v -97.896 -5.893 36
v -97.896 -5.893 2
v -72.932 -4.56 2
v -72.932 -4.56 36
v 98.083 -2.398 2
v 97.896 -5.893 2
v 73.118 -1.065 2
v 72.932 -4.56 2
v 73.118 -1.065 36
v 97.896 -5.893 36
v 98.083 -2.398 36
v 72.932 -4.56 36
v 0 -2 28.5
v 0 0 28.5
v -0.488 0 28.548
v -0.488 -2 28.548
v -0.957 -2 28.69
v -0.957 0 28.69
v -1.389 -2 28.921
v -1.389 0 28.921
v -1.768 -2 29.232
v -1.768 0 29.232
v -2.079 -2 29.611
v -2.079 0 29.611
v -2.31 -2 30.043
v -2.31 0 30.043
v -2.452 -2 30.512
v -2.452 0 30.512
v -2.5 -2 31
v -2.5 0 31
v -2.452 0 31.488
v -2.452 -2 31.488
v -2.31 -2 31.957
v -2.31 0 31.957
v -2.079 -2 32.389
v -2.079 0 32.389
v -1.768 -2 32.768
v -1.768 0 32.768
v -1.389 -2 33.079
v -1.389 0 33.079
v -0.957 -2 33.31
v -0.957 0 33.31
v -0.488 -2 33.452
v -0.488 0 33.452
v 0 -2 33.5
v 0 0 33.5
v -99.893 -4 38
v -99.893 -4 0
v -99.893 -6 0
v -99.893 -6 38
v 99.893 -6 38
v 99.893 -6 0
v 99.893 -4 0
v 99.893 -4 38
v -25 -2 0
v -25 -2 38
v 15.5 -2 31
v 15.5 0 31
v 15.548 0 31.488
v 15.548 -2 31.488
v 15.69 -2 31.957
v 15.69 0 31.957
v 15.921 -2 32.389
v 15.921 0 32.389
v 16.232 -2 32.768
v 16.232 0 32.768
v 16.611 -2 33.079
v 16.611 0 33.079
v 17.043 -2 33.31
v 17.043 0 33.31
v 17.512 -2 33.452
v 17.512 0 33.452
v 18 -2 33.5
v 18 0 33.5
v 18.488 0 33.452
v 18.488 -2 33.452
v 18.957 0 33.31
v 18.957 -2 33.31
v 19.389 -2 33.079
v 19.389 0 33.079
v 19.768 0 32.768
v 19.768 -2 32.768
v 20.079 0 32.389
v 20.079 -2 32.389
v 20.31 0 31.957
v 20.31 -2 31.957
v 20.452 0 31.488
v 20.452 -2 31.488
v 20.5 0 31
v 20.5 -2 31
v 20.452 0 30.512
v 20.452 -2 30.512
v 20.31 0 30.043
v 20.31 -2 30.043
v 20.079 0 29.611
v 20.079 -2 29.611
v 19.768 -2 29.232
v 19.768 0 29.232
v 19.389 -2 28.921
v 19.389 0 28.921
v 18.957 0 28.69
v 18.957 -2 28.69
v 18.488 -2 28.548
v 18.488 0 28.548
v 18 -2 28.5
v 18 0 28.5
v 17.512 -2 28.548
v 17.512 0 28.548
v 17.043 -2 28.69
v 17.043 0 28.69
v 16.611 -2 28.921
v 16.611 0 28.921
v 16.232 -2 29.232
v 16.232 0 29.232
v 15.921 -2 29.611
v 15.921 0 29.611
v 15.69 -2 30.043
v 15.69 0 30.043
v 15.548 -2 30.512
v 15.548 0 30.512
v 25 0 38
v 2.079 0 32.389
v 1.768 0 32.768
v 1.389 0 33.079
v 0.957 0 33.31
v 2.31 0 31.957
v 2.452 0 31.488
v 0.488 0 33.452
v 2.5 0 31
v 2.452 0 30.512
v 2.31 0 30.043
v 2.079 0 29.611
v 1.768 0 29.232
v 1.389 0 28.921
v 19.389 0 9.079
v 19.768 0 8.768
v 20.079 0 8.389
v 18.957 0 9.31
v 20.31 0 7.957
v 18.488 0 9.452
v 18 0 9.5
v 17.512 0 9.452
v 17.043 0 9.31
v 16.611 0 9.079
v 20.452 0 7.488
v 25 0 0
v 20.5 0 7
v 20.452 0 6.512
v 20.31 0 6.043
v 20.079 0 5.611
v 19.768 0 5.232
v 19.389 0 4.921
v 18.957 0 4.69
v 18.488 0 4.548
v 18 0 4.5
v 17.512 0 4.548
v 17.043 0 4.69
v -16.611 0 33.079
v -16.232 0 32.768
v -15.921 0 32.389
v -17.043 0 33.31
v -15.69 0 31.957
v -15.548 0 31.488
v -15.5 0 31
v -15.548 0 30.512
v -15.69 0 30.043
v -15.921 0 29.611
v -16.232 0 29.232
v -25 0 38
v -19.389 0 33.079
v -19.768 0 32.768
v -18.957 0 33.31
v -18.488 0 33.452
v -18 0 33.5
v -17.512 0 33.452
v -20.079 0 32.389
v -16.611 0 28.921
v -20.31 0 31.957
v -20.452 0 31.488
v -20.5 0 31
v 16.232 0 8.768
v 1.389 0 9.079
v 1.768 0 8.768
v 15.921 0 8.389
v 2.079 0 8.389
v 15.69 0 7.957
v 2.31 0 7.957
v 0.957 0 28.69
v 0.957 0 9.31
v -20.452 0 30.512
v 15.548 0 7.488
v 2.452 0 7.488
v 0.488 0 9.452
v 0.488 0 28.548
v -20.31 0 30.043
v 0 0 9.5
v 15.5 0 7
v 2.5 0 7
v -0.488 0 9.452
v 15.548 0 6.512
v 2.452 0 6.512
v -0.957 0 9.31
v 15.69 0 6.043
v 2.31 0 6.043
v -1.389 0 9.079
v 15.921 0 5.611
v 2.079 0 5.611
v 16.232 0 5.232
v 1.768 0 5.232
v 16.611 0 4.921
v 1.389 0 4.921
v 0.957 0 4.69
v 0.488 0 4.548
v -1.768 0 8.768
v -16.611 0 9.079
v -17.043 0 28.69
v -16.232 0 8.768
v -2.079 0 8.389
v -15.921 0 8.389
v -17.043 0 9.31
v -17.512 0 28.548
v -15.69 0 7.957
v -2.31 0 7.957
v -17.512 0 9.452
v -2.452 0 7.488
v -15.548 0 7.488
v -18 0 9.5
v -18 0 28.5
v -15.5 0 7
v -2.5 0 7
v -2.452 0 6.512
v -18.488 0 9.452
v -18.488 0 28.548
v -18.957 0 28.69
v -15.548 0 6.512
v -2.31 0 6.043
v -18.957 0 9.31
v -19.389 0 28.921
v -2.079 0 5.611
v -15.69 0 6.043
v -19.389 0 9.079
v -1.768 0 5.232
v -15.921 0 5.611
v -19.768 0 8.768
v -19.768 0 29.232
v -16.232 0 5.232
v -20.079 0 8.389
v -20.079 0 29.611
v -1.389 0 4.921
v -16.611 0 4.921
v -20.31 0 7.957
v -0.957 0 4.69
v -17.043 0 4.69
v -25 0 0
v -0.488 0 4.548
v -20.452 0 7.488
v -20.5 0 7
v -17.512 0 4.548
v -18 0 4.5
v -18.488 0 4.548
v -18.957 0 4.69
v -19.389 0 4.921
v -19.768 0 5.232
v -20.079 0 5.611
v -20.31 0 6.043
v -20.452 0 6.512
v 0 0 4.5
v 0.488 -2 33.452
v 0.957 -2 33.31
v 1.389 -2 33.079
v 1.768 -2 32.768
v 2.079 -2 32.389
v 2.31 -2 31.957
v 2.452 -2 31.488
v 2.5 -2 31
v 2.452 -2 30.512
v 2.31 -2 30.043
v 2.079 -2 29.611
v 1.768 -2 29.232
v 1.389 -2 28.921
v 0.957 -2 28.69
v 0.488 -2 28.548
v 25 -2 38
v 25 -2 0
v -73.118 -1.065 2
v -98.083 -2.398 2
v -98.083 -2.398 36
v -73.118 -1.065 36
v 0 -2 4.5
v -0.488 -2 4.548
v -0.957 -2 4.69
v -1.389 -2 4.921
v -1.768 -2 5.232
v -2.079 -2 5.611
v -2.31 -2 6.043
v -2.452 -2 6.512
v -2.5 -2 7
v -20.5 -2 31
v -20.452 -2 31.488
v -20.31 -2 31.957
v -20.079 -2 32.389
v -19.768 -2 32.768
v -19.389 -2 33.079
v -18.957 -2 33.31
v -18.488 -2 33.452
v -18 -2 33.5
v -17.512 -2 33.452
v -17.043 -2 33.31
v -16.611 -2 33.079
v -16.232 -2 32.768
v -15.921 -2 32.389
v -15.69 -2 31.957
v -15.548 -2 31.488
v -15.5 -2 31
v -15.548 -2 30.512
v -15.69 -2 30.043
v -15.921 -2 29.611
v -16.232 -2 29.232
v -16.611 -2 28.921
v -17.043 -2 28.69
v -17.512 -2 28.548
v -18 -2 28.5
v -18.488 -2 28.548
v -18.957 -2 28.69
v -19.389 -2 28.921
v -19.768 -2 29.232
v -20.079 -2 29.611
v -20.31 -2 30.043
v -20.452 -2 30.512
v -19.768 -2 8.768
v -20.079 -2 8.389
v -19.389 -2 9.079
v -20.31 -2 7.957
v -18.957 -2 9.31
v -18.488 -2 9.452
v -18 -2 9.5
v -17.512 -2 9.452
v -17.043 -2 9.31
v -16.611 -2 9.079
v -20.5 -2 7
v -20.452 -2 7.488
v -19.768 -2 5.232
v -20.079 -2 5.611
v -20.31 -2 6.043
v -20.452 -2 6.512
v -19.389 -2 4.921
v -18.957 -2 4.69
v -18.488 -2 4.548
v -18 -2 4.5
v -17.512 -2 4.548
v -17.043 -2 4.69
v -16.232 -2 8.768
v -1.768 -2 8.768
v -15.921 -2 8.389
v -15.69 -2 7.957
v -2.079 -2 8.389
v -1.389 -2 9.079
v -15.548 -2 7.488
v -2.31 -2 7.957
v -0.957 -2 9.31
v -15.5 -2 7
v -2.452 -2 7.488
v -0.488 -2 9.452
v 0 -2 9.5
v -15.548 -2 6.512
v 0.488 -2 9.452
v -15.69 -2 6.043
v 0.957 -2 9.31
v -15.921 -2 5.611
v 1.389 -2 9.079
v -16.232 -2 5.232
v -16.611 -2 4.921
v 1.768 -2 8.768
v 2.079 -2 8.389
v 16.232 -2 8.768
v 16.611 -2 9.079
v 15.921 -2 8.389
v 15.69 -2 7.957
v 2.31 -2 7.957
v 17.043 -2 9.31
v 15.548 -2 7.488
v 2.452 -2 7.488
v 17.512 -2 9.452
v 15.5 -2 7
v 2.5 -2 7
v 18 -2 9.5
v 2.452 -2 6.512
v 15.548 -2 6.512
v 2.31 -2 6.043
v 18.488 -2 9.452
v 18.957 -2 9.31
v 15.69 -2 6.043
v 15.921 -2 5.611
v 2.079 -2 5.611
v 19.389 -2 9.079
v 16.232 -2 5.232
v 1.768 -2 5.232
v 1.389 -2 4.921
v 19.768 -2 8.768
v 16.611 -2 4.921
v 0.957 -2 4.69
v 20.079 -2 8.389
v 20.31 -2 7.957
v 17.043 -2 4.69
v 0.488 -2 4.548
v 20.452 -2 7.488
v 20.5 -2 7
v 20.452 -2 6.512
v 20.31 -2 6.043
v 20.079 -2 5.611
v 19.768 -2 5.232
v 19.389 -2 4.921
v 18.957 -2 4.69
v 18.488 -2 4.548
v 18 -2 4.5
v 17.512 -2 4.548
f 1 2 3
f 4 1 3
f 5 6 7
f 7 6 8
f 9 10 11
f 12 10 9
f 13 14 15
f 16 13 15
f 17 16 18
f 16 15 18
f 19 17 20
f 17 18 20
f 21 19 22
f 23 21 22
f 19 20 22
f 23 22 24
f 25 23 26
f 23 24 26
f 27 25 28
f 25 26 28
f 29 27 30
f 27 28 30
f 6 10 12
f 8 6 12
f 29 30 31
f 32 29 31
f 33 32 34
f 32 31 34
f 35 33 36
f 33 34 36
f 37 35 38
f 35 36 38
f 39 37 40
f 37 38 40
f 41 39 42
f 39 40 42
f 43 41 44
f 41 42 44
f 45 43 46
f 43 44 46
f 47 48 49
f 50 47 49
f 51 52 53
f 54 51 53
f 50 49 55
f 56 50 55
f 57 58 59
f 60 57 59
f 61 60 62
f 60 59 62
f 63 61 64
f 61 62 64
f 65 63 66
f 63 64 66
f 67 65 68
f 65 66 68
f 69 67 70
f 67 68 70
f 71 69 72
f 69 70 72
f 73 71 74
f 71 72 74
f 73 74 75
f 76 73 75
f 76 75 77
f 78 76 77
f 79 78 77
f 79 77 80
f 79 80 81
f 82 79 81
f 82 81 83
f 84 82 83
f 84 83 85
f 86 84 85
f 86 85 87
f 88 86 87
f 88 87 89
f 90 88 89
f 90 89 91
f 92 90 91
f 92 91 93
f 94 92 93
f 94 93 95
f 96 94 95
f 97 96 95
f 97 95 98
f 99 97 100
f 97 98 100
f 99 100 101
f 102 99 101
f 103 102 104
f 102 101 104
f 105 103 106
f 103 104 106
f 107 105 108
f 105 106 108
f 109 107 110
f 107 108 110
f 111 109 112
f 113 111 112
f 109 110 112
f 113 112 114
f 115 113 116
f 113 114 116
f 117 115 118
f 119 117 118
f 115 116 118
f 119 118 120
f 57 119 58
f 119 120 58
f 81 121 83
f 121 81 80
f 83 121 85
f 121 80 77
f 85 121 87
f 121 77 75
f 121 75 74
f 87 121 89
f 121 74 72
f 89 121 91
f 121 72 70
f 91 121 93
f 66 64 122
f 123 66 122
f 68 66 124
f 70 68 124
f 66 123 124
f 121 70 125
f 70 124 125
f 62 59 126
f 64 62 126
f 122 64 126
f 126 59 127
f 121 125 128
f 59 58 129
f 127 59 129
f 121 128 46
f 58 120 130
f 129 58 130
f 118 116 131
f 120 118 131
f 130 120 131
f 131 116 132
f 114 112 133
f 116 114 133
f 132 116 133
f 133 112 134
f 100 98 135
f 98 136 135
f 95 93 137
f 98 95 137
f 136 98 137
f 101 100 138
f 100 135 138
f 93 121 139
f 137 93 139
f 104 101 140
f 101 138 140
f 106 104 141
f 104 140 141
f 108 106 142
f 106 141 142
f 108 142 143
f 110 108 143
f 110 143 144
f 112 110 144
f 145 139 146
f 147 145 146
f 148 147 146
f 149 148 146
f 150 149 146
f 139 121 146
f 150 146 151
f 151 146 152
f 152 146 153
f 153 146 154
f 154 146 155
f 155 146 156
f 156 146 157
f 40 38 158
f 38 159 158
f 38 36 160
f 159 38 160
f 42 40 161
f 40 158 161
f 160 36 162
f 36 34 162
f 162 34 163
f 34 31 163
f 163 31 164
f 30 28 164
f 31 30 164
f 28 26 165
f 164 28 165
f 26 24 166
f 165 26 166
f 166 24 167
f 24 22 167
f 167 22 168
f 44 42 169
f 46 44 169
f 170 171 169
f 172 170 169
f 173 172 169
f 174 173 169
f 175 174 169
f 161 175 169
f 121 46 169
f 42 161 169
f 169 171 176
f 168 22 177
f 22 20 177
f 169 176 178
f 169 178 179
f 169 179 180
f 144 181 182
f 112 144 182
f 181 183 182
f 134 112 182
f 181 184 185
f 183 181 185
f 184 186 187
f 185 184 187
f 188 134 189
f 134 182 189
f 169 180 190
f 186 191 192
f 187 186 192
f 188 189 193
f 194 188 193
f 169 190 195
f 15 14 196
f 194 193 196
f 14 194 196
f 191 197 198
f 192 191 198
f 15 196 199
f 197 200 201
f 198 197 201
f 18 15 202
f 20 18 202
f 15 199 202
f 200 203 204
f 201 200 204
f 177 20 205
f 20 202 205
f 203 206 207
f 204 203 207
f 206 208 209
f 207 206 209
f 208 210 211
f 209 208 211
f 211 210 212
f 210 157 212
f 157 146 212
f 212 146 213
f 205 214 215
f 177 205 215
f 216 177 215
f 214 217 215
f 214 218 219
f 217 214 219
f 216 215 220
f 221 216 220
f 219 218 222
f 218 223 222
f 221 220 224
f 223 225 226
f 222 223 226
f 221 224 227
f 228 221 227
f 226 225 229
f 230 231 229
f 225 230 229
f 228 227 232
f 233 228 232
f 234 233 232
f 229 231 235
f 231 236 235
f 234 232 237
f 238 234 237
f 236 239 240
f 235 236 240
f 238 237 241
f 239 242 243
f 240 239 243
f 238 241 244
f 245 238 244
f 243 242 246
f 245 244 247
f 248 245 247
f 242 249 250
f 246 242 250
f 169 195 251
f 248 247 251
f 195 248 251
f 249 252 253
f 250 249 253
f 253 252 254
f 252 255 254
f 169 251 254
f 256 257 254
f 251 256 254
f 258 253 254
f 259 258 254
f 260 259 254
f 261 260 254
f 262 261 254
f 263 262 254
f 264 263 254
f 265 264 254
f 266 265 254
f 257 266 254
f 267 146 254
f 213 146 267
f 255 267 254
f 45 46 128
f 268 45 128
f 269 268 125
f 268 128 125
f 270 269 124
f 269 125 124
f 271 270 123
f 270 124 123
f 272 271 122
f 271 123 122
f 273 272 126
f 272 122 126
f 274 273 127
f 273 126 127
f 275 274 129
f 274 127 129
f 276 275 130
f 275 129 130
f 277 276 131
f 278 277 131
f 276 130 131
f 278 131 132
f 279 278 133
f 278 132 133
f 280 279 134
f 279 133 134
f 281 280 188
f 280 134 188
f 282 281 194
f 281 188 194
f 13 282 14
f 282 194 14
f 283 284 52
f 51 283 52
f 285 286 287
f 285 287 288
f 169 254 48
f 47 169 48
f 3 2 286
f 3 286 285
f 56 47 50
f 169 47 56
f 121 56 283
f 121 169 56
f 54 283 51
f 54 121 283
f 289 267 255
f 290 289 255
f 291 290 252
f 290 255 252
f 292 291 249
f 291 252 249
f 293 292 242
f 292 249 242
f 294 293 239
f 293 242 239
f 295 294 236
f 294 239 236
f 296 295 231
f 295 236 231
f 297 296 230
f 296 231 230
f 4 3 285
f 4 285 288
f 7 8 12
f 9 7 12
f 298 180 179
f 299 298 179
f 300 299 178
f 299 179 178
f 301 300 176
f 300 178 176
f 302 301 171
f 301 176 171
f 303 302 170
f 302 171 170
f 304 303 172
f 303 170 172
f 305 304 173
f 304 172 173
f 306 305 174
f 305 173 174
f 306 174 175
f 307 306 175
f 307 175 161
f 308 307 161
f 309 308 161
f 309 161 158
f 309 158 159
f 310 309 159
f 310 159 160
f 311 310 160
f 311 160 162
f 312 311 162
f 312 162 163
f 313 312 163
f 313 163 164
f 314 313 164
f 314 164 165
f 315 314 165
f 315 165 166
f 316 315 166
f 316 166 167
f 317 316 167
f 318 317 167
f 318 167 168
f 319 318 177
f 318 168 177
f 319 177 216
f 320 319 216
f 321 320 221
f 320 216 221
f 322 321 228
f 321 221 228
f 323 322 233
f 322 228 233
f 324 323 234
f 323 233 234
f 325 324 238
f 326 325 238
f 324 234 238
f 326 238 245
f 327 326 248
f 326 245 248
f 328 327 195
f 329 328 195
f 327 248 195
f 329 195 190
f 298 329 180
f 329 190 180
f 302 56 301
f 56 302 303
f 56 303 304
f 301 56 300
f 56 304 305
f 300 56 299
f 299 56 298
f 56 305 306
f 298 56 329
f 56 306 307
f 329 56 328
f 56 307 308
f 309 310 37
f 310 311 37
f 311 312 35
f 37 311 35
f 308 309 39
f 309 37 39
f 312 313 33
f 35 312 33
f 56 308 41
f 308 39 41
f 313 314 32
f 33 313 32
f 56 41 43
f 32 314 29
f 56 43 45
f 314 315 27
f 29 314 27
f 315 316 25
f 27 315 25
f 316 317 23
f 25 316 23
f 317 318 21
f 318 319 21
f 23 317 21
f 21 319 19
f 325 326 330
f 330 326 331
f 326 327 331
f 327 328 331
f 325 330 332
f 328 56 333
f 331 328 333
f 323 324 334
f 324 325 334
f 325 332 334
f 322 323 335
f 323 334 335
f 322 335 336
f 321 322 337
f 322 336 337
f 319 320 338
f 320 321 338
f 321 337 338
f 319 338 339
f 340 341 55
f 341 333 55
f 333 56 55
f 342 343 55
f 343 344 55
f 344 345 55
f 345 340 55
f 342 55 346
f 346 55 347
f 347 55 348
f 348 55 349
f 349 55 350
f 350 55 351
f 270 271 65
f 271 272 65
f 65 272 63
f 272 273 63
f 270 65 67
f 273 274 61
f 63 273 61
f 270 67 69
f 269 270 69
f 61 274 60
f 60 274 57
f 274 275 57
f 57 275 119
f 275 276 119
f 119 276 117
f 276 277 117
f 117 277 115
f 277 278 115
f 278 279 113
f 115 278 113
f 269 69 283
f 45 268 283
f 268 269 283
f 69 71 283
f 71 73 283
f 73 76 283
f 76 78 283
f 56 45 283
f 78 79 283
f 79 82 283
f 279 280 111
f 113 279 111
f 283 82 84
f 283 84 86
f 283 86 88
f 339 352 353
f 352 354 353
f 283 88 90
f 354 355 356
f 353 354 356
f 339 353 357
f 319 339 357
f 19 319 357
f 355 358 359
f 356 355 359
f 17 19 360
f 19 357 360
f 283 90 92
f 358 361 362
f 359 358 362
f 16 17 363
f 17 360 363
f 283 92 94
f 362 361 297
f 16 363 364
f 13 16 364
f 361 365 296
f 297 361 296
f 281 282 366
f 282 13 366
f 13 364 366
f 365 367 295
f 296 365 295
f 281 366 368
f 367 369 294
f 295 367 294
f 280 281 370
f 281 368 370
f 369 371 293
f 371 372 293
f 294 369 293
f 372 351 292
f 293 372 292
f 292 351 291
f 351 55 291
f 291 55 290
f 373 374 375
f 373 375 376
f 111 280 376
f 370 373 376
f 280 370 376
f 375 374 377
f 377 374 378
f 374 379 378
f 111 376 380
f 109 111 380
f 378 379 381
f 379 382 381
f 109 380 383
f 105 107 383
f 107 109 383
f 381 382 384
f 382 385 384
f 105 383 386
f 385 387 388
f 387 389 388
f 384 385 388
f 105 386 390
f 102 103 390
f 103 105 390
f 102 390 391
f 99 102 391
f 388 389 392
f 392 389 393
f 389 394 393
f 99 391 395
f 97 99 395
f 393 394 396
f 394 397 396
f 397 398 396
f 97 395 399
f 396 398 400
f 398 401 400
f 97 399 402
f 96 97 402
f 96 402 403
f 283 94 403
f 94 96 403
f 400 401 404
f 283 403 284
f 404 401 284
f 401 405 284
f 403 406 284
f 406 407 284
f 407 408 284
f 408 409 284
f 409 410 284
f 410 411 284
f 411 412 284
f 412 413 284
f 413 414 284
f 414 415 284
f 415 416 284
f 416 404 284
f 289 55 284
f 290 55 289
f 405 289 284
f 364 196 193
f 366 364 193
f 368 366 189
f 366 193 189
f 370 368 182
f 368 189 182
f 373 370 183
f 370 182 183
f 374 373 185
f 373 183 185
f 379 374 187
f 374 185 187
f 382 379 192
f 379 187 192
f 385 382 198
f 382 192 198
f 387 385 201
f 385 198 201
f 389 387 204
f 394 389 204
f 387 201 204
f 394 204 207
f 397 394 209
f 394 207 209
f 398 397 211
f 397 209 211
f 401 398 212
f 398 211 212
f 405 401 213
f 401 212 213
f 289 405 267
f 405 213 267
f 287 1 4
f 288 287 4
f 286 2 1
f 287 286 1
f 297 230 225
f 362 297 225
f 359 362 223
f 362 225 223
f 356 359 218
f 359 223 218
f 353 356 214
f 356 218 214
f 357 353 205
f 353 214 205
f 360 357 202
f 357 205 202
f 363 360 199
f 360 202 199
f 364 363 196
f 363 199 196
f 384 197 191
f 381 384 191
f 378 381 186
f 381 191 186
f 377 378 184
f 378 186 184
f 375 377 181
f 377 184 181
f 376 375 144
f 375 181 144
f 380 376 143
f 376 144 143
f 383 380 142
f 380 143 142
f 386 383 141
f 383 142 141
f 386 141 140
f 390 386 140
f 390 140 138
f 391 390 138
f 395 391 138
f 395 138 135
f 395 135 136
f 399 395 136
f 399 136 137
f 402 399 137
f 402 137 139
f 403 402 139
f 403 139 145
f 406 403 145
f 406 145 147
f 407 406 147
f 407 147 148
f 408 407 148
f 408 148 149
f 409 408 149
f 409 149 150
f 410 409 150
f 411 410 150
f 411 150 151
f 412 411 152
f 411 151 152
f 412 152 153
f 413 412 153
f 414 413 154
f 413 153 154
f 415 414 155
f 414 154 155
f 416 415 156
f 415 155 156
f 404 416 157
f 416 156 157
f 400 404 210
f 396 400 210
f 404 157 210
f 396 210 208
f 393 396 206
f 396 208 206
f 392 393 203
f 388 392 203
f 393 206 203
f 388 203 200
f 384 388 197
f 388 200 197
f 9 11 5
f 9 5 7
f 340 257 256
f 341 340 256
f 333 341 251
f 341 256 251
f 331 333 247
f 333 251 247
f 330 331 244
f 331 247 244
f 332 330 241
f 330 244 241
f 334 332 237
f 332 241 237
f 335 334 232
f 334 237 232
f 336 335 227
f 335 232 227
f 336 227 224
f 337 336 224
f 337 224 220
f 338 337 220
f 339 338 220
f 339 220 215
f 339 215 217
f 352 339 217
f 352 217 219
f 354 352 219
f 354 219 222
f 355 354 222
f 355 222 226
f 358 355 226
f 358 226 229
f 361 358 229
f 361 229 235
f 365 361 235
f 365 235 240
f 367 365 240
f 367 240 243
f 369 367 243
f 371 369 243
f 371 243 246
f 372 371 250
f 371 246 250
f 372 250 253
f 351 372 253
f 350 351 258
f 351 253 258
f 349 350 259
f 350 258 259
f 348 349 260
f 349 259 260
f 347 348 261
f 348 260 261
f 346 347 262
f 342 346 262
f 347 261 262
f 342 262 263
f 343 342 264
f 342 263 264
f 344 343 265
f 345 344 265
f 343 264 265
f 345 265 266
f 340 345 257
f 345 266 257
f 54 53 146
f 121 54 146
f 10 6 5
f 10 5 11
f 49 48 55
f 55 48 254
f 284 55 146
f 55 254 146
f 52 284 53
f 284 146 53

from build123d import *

# Parameters (mm, degrees)
F1_DEPTH = 38
F3_W     = 25
F3_H     = 34
F4_DEPTH = 3.5
F2_R     = 2.5
F6_DEPTH = 25


with BuildPart() as f1:
    # F0 (on Top) → F1 (new body)
    with BuildSketch(Plane.XY):
        Polygon((0, -2), (0, 0), (-25, 0), (-99.8932573734, -4), (-99.8932573734, -6), (-25, -2), align=None)
        Polygon((25, 0), (0, 0), (0, -2), (25, -2), (99.8932573734, -6), (99.8932573734, -4), align=None)
    extrude(amount=F1_DEPTH)

    # F2 (on face) → F6 (cut)
    with BuildSketch(Plane(origin=(0, 0, 0), x_dir=(-1, 0, 0), z_dir=(0, 1, 0))):
        with BuildLine():
            ThreePointArc((2.5, 31), (1.767766953, 32.767766953), (0, 33.5))
            Line((0, 33.5), (0, 28.5))
            ThreePointArc((0, 28.5), (1.767766953, 29.232233047), (2.5, 31))
        make_face()
        with BuildLine():
            ThreePointArc((2.5, 7), (1.767766953, 8.767766953), (0, 9.5))
            Line((0, 9.5), (0, 4.5))
            ThreePointArc((0, 4.5), (1.767766953, 5.232233047), (2.5, 7))
        make_face()
        with BuildLine():
            Line((0, 4.5), (0, 9.5))
            ThreePointArc((0, 9.5), (-2.5, 7), (0, 4.5))
        make_face()
        with BuildLine():
            Line((0, 28.5), (0, 33.5))
            ThreePointArc((0, 33.5), (-2.5, 31), (0, 28.5))
        make_face()
        with Locations((18, 31)):
            Circle(F2_R)
        with Locations((18, 7)):
            Circle(F2_R)
        with Locations((-18, 31)):
            Circle(F2_R)
        with Locations((-18, 7)):
            Circle(F2_R)
    extrude(amount=-F6_DEPTH, mode=Mode.SUBTRACT)


with BuildPart() as f4:
    # F3 (on face) → F4 (new body)
    with BuildSketch(Plane(origin=(0.0354037438, -0.6628754245, 0), x_dir=(0.998576765, 0.0533333333, 0), z_dir=(0.0533333333, -0.998576765, 0))):
        with Locations((-85.5710857911, 19)):
            Rectangle(F3_W, F3_H)
    extrude(amount=-F4_DEPTH)


with BuildPart() as f5_1:
    # F5: instance of F4
    add(f4.part.mirror(Plane.YZ))


solid = Compound([f1.part, f4.part, f5_1.part])
